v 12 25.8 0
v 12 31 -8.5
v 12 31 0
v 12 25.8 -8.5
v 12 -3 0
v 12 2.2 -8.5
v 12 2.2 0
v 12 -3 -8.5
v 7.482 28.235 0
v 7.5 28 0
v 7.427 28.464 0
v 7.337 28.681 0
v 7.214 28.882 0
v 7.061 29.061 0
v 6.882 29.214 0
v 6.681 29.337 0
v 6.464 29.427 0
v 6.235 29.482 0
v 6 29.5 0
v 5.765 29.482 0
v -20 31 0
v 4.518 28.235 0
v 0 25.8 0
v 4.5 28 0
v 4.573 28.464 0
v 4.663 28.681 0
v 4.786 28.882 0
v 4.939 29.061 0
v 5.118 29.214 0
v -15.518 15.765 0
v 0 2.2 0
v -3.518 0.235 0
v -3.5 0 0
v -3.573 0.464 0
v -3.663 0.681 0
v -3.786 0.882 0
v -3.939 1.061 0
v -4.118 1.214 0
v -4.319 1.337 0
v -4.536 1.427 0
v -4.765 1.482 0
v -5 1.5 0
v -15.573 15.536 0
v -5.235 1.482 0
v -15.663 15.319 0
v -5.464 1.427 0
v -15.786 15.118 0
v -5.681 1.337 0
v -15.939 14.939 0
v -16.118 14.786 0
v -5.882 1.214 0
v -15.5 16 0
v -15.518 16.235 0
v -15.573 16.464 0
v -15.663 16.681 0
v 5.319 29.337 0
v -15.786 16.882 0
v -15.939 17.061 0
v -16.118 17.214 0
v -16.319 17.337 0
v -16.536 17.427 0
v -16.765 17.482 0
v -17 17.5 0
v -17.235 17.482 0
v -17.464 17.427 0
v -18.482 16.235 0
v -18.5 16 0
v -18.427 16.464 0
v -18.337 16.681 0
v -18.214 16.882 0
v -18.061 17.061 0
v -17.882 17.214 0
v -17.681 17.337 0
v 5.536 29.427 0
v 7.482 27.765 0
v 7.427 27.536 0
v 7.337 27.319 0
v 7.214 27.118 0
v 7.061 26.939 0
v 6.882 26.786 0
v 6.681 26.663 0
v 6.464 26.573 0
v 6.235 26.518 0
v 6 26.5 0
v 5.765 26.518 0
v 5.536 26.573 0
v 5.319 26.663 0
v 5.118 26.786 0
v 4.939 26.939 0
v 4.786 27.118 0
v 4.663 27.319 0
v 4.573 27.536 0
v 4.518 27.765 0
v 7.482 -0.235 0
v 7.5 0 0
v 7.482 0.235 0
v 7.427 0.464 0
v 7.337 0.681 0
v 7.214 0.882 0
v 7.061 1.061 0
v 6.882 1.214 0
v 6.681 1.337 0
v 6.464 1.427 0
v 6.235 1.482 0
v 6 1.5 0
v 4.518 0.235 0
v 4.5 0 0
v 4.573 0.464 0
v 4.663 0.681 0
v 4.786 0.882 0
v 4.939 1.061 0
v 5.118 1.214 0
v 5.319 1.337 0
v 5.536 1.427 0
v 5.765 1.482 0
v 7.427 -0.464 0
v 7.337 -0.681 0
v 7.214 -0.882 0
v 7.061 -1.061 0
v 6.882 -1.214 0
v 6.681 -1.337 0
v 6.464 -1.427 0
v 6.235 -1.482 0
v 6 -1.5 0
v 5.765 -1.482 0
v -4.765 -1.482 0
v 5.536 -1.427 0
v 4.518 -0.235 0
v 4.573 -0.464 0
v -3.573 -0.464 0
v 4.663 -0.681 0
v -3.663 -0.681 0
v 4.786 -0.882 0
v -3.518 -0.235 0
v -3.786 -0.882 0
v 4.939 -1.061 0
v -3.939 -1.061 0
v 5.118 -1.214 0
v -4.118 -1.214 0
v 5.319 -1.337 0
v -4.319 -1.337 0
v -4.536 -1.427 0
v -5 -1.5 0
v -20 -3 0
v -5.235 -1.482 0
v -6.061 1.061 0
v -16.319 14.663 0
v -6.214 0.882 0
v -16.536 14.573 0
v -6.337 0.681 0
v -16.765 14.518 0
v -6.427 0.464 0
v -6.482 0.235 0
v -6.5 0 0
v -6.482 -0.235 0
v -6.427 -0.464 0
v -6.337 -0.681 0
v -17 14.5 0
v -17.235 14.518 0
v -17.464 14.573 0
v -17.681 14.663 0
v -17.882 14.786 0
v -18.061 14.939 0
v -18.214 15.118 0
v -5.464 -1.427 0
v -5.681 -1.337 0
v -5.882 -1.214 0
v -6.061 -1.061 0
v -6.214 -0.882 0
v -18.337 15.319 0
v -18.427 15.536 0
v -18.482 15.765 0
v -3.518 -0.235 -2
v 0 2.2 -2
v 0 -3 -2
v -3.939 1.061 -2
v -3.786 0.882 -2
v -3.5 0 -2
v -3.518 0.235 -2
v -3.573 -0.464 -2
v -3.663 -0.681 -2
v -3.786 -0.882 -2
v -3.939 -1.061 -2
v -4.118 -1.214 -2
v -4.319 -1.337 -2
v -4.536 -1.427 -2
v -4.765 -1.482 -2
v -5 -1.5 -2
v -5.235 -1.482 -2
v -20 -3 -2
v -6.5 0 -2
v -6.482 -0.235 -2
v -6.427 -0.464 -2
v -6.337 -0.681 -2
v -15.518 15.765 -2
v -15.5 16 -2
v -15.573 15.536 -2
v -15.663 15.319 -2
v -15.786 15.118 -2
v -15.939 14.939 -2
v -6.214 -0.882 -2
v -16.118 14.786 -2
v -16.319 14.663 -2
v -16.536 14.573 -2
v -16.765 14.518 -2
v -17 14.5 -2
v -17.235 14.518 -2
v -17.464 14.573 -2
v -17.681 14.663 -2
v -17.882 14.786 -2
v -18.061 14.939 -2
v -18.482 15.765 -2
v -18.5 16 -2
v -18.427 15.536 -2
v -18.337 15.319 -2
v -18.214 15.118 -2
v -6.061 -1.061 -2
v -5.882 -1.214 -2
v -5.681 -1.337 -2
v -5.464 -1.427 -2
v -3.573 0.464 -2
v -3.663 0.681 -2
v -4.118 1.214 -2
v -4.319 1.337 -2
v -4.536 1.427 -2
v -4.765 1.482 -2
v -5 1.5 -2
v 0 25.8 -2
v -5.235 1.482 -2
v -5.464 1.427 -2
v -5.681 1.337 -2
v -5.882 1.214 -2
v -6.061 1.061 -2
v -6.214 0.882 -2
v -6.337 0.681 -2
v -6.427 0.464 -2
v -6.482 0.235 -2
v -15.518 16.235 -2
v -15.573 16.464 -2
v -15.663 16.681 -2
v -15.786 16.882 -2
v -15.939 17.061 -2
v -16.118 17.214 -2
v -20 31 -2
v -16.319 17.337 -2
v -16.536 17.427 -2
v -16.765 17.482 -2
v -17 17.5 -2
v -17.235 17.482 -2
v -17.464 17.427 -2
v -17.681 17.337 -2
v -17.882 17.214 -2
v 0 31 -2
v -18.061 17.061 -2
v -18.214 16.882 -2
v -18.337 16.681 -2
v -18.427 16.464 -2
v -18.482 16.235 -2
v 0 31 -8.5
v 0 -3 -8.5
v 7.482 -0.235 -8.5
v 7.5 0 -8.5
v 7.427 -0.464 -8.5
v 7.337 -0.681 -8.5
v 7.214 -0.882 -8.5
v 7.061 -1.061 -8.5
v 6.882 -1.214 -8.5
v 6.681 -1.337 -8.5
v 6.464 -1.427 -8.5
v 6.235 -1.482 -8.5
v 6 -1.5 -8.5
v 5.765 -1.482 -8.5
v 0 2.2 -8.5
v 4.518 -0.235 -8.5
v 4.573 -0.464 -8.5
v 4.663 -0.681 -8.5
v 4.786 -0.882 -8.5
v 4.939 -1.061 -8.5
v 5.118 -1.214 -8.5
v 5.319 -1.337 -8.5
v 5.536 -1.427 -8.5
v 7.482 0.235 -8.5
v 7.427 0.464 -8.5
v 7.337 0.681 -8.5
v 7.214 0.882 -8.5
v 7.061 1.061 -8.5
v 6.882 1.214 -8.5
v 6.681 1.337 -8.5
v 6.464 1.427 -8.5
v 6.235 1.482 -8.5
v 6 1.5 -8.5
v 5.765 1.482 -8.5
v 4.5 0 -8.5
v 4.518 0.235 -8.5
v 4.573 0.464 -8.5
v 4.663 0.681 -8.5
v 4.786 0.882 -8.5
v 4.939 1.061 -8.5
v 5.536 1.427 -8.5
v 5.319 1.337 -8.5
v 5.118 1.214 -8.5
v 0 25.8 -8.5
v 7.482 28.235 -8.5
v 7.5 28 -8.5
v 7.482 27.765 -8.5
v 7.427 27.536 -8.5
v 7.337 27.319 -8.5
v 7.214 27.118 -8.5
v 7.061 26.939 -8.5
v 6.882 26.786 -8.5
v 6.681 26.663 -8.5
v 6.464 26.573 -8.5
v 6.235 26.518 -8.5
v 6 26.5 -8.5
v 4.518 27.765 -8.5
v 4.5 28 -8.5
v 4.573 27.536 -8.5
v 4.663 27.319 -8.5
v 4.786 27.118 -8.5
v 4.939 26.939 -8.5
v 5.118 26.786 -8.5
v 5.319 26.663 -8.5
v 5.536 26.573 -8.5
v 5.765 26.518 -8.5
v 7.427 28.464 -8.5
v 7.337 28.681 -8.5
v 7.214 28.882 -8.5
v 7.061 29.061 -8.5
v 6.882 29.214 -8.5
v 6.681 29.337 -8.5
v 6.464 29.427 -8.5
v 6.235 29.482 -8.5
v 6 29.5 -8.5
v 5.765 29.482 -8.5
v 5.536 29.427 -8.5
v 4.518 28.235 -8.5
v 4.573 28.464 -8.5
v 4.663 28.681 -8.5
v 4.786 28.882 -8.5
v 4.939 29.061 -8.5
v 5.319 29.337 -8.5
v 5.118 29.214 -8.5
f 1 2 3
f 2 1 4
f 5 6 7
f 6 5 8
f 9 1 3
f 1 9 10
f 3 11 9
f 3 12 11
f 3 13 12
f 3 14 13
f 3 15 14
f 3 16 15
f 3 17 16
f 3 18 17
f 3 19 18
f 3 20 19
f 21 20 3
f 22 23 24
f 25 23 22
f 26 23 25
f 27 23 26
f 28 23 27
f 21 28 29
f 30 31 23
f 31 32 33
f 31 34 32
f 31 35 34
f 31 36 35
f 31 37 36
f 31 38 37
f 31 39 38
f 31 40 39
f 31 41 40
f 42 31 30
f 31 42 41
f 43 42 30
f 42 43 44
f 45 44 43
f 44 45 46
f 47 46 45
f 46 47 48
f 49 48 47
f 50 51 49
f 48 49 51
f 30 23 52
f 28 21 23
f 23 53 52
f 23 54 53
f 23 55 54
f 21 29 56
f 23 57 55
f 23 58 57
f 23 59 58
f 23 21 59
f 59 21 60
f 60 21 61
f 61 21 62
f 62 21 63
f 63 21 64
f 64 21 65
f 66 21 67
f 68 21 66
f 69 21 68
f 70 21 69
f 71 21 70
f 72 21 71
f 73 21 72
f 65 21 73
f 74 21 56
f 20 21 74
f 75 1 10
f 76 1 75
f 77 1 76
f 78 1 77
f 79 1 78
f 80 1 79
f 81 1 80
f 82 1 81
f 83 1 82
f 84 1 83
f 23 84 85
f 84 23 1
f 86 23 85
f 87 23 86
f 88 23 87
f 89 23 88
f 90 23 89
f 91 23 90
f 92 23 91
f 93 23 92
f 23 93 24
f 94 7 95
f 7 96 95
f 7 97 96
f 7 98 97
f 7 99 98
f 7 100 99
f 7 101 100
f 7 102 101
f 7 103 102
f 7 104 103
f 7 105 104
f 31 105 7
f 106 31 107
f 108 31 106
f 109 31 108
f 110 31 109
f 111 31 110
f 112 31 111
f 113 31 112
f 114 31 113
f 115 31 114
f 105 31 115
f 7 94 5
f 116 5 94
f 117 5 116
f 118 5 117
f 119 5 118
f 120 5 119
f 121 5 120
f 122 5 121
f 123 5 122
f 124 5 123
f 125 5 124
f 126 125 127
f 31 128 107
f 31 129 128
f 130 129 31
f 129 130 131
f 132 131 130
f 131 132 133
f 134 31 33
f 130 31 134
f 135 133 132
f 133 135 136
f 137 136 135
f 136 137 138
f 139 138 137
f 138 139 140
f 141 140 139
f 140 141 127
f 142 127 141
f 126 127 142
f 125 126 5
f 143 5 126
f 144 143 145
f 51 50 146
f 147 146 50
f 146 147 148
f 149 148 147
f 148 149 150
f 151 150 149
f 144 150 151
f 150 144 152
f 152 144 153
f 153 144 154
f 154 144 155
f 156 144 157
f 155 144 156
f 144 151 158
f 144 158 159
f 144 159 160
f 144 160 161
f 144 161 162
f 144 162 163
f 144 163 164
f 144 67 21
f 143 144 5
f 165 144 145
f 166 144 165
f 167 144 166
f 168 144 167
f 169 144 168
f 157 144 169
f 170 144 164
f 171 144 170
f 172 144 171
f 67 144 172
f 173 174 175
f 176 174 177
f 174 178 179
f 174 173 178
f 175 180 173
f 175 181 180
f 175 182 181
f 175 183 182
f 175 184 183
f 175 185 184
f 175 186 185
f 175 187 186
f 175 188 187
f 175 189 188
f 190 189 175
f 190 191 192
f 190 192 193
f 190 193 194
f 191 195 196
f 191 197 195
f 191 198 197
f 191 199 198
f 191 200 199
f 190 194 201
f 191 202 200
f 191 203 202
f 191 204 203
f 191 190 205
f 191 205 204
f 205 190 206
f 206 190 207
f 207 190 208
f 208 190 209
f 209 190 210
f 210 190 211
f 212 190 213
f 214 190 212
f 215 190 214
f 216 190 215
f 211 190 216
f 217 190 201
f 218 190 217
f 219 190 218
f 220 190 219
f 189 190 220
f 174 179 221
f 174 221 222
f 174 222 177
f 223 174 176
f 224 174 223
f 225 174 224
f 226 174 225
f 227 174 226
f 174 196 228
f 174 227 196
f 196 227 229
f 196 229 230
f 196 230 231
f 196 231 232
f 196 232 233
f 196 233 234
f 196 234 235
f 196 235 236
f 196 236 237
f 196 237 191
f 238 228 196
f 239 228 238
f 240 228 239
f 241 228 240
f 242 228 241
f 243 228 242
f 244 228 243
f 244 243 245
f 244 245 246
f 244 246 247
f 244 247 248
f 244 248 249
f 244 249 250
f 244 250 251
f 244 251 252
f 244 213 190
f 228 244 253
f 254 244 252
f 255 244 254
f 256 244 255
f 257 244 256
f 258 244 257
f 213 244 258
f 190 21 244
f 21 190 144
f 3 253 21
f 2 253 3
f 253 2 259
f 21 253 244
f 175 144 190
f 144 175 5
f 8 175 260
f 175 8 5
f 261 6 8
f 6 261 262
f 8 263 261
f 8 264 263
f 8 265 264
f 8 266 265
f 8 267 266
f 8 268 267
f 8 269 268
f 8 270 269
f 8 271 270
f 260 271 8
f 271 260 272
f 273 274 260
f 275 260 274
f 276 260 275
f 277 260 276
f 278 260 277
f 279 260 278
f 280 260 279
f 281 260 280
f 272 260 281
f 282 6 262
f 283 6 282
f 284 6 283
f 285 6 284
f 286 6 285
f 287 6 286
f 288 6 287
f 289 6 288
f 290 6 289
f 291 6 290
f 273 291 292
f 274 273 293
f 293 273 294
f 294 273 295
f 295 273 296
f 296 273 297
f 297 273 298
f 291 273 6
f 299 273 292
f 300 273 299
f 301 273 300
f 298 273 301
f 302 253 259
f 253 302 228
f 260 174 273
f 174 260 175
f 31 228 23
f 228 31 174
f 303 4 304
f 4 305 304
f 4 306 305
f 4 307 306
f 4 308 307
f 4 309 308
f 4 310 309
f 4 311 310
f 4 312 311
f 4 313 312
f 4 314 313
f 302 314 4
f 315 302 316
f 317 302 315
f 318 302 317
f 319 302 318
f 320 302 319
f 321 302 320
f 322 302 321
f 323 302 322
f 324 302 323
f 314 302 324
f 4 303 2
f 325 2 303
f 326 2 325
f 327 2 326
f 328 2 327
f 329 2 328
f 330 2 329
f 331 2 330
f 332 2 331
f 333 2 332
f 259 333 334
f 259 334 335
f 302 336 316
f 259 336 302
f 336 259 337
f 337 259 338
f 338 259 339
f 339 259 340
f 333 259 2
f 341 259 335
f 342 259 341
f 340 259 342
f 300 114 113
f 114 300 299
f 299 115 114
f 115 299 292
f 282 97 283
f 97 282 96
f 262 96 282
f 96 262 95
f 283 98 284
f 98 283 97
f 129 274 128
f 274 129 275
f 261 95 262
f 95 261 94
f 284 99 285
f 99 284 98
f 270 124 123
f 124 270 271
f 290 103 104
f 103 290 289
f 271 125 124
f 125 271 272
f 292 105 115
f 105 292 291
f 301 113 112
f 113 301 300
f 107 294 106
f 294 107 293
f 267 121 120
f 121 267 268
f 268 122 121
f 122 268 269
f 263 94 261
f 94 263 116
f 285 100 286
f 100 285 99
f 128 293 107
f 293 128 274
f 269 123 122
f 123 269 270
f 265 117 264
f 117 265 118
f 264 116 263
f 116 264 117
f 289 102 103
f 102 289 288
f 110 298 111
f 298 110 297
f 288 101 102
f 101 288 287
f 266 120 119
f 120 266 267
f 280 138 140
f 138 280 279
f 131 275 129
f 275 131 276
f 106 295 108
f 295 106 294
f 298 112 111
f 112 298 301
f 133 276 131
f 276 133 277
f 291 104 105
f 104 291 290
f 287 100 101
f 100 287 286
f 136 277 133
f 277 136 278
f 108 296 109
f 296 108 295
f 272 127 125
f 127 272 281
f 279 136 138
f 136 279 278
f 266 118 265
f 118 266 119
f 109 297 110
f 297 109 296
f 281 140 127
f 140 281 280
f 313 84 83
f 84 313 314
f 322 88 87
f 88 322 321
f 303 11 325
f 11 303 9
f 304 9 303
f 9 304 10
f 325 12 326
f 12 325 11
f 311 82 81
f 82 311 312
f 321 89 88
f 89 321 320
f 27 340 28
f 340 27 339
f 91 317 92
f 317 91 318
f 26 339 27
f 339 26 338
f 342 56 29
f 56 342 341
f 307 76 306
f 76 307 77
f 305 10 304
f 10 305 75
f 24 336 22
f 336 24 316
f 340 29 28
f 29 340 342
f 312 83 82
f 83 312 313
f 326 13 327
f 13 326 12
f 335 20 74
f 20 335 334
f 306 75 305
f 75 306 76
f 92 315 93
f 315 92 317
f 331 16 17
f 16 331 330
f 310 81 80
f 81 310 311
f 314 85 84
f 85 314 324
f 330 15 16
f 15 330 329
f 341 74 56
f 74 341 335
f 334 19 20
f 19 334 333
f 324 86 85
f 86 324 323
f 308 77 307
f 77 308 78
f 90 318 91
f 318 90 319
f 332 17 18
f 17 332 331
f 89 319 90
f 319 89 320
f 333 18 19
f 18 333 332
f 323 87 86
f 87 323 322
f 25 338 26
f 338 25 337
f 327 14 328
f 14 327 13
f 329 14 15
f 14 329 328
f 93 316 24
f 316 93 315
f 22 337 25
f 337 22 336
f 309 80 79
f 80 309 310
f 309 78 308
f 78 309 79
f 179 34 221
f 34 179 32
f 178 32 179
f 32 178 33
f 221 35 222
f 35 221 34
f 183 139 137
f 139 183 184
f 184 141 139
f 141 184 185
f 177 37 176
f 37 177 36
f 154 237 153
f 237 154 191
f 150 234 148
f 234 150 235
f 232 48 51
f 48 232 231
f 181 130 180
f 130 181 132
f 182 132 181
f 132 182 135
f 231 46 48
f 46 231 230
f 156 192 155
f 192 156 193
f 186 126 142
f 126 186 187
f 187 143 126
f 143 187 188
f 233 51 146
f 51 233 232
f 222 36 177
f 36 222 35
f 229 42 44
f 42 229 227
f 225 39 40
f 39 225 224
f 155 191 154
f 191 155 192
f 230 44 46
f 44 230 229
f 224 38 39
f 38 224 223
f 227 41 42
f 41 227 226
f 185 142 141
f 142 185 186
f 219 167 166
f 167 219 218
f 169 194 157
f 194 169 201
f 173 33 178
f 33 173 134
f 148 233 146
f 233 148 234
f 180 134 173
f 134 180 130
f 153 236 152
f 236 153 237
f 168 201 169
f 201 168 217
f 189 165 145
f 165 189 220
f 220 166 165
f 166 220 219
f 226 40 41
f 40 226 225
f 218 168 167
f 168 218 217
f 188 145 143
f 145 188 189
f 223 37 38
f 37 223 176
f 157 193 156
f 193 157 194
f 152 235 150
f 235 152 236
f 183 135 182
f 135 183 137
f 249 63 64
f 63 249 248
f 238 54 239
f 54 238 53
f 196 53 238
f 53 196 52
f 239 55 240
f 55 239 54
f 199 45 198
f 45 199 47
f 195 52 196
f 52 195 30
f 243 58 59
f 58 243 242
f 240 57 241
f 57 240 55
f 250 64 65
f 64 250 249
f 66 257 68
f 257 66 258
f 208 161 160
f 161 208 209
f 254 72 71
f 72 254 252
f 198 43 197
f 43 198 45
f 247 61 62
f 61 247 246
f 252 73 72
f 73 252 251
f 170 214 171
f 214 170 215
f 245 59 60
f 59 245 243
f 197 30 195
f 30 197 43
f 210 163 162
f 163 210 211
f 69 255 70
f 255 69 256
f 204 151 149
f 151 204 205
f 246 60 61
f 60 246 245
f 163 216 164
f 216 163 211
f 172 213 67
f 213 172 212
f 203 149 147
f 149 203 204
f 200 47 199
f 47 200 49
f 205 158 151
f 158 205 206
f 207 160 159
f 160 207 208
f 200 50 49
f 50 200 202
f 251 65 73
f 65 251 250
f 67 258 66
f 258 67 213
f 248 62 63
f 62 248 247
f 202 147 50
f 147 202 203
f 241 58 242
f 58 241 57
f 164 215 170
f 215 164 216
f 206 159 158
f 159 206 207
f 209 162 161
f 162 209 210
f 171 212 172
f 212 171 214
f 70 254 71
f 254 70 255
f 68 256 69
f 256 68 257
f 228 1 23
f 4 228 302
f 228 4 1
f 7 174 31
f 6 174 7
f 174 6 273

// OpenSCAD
module diera(sx,sy) {
    translate([sx,sy,0]) cylinder(h=20,d=3,center=true,$fn=40);
}

module diery() {
    diera(6,0);
    diera(6,28);
    diera(-5,0);
    diera(-17,16);
}

module zakladna() {
    translate([-20,-3,-2]) cube([32,34,2]);
    translate([0,-3,-8.5]) cube([12,5.7,8.5]);
    translate([0,25.3,-8.5]) cube([12,5.7,8.5]);
}

module vyrez() {
    translate([0,2.2,-10]) cube([14,23.6,20]);
}

//rotate([0,180,0]) 
difference() {
    zakladna();
    diery();
    vyrez();
}
